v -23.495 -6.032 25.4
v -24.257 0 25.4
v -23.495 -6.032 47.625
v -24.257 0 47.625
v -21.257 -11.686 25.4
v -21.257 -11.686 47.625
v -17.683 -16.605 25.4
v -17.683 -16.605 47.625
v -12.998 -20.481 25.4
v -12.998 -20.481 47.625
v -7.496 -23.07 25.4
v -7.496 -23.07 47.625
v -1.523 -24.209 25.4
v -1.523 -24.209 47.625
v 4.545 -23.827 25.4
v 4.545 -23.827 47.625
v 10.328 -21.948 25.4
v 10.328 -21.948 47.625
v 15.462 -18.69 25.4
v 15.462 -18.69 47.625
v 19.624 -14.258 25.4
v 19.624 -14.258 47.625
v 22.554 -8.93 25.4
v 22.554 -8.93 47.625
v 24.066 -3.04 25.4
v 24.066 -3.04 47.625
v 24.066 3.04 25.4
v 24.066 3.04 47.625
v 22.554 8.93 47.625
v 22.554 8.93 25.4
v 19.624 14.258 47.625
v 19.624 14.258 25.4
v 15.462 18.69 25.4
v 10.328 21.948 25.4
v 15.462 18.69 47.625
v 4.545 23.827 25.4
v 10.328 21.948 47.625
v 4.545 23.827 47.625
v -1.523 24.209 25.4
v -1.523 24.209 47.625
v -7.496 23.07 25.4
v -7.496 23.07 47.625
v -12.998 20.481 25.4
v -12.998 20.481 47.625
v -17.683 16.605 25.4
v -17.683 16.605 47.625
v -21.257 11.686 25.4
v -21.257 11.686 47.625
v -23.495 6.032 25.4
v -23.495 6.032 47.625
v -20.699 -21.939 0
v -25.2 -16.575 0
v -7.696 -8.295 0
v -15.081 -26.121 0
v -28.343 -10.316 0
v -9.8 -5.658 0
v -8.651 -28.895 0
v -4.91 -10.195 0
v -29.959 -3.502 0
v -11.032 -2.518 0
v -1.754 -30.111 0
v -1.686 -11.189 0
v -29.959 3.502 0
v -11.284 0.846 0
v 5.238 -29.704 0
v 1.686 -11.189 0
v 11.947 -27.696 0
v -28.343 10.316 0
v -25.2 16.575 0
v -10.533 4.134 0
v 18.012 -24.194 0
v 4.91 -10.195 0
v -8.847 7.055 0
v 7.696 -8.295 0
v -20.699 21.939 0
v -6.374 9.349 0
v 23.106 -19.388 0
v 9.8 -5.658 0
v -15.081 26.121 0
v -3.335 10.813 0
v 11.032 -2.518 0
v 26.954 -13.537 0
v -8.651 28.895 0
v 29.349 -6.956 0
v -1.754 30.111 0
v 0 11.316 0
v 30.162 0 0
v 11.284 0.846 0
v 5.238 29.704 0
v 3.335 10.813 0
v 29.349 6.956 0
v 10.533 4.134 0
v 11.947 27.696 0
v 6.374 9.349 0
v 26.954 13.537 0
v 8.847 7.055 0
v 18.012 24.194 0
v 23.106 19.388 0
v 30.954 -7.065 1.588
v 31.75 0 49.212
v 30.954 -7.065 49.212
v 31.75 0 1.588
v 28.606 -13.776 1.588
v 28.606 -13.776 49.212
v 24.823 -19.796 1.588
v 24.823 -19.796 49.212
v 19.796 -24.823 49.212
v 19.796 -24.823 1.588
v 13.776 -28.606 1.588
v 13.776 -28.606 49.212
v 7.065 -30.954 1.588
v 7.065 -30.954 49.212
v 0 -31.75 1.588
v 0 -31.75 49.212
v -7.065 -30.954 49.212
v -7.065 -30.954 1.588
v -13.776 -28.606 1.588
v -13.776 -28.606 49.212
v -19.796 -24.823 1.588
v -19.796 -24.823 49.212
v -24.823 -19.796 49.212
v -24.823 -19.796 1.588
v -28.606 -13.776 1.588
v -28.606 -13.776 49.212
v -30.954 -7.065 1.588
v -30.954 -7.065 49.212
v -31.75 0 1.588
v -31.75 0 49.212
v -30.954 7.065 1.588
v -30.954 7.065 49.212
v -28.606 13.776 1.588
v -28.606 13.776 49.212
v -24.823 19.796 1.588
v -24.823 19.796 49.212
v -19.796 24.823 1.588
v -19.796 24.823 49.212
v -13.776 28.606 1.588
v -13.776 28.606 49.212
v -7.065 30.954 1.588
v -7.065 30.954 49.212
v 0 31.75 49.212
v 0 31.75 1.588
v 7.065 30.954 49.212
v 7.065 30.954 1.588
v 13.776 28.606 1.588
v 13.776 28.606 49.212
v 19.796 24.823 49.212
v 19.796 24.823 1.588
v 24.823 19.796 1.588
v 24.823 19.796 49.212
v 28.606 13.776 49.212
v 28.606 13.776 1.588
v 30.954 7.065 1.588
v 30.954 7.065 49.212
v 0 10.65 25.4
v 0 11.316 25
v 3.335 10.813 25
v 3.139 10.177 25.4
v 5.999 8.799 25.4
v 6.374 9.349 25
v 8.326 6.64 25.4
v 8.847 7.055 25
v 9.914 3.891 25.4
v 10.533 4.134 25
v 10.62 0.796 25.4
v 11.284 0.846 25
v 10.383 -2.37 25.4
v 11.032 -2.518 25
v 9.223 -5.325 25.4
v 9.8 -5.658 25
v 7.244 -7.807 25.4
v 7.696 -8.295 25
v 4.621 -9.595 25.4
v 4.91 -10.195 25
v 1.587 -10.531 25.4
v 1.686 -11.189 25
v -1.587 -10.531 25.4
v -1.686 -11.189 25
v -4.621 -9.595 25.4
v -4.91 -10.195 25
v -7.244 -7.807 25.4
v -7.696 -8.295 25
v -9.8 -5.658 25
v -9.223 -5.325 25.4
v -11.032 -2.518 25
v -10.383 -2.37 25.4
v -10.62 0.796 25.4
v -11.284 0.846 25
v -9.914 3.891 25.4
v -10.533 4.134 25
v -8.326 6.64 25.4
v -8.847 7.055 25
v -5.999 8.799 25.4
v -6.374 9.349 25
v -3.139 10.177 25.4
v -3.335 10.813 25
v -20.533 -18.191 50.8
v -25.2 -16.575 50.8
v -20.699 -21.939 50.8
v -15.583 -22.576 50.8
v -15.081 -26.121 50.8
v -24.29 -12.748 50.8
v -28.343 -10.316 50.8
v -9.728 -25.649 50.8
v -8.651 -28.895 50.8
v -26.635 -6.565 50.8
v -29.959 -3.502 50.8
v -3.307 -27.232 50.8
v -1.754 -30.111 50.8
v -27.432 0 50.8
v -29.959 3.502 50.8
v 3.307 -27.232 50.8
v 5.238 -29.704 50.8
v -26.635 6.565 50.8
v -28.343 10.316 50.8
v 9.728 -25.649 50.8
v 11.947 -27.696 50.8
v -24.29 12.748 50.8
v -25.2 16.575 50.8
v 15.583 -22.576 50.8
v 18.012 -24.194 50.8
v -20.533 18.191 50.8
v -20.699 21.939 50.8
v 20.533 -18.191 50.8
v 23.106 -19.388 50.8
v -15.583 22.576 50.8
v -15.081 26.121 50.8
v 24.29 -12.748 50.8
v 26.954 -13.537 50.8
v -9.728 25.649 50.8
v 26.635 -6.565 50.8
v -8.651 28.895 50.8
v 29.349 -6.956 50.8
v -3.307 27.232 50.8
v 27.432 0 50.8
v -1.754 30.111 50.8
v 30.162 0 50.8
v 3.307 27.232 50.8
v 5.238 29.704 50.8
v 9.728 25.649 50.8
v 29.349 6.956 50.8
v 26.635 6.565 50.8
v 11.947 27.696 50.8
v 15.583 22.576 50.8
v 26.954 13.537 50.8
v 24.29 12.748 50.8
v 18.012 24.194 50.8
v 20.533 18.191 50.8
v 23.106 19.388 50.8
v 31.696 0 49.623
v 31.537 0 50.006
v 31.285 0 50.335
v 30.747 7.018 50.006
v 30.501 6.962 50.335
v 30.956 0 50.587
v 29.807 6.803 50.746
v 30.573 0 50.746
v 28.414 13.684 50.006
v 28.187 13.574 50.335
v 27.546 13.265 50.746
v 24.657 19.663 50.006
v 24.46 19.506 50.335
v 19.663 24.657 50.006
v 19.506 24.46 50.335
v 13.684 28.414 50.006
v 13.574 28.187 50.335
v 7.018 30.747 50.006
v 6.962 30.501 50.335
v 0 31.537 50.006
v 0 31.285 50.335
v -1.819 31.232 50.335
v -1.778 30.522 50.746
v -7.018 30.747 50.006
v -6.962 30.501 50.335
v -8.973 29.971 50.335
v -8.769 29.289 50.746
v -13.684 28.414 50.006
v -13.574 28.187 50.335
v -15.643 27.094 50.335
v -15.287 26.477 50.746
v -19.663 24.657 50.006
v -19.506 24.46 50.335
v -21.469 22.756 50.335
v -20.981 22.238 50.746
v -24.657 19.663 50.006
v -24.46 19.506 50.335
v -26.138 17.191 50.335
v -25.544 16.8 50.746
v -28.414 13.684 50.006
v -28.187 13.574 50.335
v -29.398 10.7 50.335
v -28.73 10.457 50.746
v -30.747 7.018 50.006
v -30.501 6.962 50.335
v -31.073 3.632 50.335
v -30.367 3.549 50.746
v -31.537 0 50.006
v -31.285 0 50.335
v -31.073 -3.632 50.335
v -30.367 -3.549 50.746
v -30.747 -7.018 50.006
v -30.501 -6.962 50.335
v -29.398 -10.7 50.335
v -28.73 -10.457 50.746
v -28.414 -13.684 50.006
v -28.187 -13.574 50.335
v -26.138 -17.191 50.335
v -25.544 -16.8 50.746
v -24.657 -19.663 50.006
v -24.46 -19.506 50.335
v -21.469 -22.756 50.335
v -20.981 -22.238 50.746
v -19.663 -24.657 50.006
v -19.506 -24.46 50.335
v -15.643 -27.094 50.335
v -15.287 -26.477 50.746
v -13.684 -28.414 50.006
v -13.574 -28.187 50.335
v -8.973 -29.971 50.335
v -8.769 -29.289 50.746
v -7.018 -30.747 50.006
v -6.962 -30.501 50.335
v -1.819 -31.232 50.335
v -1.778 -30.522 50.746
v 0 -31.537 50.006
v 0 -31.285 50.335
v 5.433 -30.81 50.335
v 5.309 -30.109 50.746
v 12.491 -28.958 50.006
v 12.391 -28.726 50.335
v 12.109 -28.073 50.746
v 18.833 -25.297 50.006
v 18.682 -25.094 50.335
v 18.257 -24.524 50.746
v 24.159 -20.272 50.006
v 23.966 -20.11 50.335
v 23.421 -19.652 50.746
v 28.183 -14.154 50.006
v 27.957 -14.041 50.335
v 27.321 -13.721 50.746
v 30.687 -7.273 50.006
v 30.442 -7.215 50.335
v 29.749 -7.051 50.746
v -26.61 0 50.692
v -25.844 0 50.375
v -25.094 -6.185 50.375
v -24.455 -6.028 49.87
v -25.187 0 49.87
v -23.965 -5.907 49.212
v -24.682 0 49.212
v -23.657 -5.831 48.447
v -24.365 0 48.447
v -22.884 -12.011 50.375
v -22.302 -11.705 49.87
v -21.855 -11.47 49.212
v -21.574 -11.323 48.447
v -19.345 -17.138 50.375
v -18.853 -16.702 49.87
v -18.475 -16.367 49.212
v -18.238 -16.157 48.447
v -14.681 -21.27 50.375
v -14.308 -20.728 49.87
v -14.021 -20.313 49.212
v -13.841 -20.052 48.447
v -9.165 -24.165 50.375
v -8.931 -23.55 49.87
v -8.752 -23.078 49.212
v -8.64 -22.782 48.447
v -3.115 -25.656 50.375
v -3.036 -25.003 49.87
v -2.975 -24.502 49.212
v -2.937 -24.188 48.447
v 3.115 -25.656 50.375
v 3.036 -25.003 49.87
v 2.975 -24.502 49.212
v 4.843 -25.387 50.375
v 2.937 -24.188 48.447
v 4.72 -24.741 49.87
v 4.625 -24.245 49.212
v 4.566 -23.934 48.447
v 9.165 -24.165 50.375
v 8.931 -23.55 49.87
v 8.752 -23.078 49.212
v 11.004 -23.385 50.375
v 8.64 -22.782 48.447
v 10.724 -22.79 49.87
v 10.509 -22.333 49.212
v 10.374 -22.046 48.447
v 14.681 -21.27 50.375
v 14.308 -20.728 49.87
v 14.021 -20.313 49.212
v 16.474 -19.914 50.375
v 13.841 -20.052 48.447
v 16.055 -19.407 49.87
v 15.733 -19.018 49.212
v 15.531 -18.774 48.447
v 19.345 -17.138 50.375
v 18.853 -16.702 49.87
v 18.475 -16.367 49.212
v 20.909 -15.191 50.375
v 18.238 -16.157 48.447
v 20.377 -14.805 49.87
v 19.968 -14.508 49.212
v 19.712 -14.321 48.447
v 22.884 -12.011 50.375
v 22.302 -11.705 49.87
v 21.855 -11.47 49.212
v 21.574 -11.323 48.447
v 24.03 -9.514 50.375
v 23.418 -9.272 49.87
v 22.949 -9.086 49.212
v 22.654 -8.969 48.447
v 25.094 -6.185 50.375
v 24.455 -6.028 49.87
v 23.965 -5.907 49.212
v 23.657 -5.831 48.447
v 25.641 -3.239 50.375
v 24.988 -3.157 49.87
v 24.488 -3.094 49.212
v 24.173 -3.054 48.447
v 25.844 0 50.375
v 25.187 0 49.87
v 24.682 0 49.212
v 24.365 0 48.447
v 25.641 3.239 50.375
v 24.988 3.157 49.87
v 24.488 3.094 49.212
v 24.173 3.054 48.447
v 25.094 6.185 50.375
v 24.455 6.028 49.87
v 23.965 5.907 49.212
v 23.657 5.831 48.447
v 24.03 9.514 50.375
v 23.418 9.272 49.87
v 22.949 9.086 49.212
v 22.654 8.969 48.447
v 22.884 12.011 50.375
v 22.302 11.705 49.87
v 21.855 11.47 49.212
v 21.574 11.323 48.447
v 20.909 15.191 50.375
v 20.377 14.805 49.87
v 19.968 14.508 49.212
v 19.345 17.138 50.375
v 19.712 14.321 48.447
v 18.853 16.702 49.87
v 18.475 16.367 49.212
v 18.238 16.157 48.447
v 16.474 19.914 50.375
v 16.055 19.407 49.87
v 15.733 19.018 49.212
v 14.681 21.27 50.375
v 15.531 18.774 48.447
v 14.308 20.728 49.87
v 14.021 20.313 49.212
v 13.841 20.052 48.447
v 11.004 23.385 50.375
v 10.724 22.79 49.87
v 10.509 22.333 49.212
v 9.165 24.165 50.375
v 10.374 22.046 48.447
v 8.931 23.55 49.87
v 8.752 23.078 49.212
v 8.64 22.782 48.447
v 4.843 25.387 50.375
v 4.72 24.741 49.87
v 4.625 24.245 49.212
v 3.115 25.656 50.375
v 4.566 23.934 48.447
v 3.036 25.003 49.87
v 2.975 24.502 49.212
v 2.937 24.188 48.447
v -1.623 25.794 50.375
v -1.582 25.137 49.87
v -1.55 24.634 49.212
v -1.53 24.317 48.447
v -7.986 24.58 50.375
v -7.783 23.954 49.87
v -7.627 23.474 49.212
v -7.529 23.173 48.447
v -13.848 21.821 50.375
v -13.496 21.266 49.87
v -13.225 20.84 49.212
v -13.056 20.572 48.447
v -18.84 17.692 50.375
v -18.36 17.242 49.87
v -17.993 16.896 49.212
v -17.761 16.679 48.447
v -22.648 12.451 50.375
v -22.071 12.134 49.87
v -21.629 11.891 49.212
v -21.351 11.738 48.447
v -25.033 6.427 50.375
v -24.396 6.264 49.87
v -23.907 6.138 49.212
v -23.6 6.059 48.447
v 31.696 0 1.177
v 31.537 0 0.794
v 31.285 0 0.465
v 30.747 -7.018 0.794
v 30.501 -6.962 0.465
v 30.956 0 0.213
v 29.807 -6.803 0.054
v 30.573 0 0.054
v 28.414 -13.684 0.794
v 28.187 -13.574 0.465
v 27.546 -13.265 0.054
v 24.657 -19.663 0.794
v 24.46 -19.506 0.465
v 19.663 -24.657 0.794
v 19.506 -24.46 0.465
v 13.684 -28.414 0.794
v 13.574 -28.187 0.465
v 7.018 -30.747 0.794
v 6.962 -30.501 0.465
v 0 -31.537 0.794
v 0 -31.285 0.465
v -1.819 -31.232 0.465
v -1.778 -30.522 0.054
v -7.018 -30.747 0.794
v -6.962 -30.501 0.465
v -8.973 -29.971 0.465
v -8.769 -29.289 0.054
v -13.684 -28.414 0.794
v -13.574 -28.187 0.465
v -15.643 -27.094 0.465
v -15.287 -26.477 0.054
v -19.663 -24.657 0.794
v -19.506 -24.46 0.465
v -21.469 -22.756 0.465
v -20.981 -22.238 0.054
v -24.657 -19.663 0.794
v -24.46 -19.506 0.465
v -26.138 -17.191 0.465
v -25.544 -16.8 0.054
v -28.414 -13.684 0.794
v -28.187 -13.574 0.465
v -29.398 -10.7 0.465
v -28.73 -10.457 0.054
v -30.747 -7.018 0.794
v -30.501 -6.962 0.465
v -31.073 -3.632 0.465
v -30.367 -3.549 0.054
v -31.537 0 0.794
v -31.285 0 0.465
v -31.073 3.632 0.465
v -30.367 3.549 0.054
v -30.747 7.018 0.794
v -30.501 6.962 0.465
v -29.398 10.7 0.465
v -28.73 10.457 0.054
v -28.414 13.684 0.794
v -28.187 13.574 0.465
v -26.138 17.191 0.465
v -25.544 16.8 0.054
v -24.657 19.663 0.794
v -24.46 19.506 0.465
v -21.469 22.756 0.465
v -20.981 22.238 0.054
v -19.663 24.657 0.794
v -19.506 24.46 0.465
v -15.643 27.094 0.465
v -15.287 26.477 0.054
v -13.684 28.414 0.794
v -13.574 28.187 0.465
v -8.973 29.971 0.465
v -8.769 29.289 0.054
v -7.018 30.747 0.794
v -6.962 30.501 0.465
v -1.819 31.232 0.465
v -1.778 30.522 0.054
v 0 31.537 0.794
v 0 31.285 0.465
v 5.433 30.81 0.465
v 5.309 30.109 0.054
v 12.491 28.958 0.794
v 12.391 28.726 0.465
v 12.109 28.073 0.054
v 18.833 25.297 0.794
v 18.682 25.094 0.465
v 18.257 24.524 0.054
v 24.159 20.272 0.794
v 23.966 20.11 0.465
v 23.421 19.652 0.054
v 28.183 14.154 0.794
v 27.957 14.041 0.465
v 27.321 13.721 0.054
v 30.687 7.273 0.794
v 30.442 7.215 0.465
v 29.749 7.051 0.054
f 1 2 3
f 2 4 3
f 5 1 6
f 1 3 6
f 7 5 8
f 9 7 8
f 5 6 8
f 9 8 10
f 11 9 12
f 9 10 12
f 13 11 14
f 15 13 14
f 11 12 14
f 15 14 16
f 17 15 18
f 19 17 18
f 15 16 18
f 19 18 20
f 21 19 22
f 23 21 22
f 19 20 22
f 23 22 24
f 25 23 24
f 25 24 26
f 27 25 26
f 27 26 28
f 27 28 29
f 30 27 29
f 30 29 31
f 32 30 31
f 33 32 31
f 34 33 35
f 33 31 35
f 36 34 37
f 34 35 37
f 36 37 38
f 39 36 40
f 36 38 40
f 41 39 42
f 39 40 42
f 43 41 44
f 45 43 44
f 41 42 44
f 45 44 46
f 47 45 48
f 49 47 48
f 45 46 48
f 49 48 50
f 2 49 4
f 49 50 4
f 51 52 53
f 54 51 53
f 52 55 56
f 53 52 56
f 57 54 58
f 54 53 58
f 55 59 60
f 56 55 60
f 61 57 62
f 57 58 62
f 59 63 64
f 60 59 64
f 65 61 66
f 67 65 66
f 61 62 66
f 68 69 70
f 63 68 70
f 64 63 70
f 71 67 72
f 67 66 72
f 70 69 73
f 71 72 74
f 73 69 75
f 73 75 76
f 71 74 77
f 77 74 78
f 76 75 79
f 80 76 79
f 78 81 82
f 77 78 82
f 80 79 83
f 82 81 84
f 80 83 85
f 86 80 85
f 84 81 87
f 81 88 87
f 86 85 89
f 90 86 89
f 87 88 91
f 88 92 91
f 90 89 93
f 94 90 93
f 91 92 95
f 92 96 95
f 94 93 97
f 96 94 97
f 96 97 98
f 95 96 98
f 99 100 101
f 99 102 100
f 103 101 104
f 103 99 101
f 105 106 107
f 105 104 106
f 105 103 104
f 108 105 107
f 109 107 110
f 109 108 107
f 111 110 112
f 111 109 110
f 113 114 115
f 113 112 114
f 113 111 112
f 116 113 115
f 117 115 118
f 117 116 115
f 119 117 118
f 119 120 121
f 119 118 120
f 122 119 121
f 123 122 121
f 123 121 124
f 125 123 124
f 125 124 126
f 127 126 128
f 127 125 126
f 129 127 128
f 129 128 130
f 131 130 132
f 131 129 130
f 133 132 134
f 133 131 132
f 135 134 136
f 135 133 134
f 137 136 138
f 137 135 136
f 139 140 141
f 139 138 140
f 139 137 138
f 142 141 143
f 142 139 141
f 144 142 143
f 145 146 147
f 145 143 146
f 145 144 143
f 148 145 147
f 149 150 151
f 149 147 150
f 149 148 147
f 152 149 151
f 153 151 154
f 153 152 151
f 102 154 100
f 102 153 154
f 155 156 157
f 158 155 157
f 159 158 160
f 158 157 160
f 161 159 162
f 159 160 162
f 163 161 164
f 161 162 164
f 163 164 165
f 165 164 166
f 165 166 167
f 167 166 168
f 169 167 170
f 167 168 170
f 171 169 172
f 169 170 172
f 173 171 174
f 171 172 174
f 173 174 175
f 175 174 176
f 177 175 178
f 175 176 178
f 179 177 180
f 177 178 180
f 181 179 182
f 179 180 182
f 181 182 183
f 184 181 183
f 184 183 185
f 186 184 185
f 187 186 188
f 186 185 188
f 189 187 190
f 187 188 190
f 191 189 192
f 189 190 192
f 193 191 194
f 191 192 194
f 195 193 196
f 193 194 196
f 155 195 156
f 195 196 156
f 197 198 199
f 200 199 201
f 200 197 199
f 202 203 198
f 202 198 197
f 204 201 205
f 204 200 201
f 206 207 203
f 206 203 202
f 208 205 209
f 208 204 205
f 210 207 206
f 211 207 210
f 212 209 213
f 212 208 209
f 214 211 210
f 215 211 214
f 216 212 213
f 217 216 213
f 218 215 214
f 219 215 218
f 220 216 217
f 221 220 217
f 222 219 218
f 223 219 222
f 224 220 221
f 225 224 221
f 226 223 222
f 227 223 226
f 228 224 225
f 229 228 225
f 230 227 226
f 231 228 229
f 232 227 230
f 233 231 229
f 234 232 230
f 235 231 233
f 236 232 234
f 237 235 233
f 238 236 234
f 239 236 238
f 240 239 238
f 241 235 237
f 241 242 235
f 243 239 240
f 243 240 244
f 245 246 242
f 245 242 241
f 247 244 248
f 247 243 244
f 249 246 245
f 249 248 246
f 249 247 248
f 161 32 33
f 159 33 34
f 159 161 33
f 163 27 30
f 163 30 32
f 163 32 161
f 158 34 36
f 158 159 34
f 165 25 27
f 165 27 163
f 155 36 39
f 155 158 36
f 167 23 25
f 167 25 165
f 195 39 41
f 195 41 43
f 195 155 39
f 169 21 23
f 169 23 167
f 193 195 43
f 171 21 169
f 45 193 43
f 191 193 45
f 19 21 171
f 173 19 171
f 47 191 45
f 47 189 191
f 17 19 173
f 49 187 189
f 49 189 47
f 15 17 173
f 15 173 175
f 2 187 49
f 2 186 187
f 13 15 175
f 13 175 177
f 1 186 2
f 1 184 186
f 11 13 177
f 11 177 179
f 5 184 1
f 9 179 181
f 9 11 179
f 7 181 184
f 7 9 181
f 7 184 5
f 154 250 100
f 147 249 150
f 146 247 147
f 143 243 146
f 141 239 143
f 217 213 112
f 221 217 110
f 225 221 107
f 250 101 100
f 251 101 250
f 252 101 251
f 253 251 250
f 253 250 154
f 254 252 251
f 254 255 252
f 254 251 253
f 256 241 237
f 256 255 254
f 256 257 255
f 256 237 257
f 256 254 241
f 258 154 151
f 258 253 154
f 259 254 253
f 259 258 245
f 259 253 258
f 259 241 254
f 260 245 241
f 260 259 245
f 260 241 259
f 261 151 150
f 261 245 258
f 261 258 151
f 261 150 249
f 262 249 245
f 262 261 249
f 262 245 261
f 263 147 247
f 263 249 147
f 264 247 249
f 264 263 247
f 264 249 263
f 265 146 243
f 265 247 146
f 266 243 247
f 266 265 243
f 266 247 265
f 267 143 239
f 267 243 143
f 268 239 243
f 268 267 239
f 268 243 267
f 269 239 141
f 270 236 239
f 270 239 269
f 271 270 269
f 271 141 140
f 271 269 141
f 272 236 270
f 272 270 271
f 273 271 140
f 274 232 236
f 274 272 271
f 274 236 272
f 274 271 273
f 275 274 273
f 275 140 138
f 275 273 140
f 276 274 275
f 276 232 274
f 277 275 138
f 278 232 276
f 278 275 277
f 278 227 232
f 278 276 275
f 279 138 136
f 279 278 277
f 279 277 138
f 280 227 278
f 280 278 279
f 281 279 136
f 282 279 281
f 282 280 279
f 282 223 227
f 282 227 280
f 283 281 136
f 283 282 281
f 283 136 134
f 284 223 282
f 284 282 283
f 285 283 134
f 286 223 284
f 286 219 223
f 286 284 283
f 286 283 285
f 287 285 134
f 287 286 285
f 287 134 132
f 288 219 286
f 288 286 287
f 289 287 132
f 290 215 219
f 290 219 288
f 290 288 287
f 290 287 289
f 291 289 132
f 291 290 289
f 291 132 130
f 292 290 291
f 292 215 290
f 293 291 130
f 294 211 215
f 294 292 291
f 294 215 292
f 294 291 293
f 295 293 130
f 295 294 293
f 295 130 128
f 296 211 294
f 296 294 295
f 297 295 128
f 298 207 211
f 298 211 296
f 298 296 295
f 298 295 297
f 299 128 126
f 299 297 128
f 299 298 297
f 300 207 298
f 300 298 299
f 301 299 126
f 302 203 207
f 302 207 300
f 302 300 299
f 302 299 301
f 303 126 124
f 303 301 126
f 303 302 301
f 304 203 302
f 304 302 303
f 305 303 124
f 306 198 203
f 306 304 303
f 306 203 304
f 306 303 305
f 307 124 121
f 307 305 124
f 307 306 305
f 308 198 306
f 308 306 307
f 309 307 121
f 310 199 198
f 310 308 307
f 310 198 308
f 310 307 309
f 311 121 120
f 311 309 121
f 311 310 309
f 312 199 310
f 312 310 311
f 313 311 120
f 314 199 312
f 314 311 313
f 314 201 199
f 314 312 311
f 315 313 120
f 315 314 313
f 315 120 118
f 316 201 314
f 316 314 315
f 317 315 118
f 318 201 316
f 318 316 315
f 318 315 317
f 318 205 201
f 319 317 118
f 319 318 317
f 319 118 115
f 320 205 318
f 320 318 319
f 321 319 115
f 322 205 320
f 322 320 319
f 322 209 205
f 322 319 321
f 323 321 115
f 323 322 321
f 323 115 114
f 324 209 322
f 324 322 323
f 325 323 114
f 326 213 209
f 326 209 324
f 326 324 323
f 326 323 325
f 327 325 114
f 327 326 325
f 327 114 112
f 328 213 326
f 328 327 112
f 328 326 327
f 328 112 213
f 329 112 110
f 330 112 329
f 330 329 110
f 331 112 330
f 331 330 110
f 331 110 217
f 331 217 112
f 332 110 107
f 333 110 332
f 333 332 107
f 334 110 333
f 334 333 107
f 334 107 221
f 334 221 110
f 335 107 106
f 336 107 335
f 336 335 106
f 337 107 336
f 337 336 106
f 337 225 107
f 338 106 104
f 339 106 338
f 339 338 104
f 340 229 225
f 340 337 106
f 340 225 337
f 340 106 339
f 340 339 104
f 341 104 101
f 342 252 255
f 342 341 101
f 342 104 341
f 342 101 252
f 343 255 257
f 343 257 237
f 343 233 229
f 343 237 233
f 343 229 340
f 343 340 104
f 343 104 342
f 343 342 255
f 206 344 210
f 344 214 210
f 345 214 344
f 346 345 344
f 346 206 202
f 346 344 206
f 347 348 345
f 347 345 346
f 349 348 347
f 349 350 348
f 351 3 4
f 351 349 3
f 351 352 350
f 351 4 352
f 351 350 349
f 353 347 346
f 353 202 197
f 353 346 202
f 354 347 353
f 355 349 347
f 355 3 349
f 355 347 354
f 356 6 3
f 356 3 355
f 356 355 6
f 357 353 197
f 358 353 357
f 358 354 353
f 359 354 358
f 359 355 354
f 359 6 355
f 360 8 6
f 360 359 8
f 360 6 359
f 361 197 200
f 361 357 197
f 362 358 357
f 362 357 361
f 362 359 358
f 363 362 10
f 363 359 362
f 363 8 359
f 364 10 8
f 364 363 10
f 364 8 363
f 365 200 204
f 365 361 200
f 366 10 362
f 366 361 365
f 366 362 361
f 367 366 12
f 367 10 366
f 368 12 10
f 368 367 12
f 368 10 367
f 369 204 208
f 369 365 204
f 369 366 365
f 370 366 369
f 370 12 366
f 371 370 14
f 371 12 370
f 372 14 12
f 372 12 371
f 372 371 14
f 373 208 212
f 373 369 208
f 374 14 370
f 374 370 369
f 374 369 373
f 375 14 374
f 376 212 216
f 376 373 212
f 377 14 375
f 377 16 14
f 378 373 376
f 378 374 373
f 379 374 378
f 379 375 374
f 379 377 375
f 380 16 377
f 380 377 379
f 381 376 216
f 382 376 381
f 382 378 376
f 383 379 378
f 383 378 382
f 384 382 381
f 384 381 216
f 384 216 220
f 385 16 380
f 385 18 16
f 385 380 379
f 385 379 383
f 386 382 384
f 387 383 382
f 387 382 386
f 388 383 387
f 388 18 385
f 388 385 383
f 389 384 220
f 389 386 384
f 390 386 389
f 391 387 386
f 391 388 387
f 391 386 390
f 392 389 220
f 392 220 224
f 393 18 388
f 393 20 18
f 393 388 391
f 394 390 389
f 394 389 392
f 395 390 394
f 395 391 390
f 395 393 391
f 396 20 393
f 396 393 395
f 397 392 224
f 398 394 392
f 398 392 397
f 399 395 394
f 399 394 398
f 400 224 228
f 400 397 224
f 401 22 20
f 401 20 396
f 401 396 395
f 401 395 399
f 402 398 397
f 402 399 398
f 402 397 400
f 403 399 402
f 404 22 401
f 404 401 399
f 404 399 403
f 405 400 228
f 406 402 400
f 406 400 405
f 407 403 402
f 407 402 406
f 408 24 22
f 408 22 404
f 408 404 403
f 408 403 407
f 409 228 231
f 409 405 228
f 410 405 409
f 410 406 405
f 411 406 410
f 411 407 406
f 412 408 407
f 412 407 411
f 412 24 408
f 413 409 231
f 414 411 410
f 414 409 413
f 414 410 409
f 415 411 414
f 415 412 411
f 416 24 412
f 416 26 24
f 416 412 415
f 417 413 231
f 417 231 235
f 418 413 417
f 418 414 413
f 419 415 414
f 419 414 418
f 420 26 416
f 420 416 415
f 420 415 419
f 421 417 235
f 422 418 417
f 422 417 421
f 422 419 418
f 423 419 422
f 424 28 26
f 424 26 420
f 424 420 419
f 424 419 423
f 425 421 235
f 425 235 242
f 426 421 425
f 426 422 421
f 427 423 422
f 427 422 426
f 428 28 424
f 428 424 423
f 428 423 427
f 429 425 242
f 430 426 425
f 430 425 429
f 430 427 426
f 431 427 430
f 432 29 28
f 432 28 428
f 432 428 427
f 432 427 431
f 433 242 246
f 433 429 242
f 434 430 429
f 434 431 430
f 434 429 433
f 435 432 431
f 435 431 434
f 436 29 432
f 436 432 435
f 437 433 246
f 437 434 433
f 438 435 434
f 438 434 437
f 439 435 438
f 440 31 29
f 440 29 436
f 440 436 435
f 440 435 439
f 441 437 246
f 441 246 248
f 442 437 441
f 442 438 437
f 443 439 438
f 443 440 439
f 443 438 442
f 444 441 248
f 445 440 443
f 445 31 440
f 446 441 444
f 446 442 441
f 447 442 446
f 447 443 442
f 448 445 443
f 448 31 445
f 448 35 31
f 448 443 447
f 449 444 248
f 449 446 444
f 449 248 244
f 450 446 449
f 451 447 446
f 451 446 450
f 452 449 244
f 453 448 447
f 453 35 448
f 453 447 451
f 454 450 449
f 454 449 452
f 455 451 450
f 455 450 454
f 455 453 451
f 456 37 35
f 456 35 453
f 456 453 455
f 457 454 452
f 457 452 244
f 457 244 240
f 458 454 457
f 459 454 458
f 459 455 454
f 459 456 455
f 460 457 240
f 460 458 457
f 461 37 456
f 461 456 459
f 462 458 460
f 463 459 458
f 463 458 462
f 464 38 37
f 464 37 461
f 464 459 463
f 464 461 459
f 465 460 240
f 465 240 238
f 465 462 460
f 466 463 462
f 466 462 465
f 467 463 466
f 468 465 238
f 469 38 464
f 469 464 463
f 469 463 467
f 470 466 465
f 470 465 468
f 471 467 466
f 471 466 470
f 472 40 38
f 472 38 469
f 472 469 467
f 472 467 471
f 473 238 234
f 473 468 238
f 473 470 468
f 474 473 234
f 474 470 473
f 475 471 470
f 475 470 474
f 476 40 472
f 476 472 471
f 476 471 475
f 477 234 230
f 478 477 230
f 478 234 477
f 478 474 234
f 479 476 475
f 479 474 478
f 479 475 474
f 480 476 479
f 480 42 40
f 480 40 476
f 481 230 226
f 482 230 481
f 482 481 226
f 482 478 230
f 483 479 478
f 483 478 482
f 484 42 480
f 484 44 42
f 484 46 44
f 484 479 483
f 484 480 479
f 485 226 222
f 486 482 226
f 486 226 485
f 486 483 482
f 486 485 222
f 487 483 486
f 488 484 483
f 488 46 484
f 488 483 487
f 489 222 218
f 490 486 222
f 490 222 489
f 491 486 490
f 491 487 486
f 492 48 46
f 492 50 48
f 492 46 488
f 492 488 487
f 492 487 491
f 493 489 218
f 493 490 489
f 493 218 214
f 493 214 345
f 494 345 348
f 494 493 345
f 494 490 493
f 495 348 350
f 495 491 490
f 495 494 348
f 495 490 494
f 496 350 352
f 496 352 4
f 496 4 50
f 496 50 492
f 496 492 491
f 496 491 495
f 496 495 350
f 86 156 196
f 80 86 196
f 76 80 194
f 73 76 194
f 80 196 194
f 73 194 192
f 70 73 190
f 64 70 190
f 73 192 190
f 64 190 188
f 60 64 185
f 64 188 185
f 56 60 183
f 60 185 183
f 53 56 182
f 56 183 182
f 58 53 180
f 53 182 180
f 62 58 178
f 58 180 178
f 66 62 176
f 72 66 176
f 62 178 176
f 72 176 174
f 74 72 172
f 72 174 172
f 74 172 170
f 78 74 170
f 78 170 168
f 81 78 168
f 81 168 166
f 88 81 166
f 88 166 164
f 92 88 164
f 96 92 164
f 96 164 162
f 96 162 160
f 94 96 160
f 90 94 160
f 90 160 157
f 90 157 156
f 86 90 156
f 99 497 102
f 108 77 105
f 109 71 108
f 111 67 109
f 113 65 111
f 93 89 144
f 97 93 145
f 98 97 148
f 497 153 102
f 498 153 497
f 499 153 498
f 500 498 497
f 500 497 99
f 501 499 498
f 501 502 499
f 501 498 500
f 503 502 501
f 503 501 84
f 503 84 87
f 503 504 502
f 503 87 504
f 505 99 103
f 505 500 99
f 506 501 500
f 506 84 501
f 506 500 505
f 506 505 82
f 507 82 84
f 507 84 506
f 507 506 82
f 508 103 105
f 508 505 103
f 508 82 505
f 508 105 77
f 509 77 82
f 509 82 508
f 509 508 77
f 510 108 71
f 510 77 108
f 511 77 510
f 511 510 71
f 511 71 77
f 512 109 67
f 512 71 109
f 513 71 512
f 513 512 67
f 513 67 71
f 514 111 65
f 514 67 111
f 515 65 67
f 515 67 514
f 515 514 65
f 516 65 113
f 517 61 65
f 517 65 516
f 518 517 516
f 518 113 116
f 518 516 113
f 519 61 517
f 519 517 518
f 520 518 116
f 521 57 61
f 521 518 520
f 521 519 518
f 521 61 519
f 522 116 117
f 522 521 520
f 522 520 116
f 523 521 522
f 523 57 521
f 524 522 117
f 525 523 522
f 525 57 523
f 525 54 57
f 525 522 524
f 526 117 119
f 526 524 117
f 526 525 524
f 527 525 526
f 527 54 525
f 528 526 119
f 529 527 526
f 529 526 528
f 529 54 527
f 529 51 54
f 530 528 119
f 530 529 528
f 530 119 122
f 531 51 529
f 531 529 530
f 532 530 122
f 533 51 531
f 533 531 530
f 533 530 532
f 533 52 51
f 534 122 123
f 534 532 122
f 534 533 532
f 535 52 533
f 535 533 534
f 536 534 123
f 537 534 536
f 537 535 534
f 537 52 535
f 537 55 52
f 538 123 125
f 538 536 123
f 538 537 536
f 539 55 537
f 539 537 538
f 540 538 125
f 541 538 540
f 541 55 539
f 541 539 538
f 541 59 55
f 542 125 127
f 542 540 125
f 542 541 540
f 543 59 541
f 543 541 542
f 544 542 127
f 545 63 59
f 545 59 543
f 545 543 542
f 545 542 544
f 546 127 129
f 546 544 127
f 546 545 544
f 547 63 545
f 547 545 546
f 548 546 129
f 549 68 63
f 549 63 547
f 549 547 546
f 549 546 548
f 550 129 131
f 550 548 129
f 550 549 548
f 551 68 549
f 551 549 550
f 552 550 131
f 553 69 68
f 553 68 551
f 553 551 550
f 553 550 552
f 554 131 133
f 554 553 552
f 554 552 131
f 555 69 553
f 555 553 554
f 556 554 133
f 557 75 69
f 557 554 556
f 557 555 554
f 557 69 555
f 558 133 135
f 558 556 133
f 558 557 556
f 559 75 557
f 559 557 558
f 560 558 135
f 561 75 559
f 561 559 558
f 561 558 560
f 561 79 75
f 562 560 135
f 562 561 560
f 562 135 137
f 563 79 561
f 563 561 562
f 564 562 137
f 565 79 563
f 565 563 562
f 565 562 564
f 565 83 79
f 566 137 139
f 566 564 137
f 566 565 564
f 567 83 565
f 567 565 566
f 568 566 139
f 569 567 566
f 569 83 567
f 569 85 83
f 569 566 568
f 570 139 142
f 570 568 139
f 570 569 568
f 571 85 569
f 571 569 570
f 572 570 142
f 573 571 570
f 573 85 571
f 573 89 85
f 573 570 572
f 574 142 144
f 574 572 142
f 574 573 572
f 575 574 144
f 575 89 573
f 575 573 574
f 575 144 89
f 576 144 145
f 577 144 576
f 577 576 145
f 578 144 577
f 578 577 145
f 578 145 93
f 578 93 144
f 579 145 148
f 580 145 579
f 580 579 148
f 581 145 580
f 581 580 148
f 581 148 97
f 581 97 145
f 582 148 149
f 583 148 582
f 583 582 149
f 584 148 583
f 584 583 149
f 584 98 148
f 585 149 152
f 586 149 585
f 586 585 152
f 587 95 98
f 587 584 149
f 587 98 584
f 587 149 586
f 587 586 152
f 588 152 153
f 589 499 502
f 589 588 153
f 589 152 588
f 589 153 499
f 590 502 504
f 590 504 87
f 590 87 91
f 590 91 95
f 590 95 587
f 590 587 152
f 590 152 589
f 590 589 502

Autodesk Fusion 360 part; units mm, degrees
sketch "Sketch1" plane through (0, 0, 0) normal (0, 0, 1) x (1, 0, 0)
  circle A0 centre (0, 0) radius 31.75
  dimension "d1" = 63.5
extrude "Extrude1" add sketch "Sketch1" along normal blind 50.8
sketch "Sketch2" plane through (0, 0, 50.8) normal (0, 0, 1) x (-1, 0, 0)
  circle A0 centre (0, 0) radius 31.75
  circle A1 centre (0, 0) radius 24.257
  dimension "d4" = 48.514
extrude "Extrude2" cut sketch "Sketch2" against normal blind 25.4 contours A1
fillet "Fillet1" radius 3.175 1 edges at (22.6155, -8.7717, 50.8)
hole "Hole1" at (0, 0, 0) direction (0, 0, 1) diameter 22.631 depth 25 tip angle 118
fillet "Fillet2" radius 1.5875 1 edges at (-29.6014, -11.4813, 0)
fillet "Fillet3" radius 1.5875 1 edges at (-29.6014, -11.4813, 50.8)
